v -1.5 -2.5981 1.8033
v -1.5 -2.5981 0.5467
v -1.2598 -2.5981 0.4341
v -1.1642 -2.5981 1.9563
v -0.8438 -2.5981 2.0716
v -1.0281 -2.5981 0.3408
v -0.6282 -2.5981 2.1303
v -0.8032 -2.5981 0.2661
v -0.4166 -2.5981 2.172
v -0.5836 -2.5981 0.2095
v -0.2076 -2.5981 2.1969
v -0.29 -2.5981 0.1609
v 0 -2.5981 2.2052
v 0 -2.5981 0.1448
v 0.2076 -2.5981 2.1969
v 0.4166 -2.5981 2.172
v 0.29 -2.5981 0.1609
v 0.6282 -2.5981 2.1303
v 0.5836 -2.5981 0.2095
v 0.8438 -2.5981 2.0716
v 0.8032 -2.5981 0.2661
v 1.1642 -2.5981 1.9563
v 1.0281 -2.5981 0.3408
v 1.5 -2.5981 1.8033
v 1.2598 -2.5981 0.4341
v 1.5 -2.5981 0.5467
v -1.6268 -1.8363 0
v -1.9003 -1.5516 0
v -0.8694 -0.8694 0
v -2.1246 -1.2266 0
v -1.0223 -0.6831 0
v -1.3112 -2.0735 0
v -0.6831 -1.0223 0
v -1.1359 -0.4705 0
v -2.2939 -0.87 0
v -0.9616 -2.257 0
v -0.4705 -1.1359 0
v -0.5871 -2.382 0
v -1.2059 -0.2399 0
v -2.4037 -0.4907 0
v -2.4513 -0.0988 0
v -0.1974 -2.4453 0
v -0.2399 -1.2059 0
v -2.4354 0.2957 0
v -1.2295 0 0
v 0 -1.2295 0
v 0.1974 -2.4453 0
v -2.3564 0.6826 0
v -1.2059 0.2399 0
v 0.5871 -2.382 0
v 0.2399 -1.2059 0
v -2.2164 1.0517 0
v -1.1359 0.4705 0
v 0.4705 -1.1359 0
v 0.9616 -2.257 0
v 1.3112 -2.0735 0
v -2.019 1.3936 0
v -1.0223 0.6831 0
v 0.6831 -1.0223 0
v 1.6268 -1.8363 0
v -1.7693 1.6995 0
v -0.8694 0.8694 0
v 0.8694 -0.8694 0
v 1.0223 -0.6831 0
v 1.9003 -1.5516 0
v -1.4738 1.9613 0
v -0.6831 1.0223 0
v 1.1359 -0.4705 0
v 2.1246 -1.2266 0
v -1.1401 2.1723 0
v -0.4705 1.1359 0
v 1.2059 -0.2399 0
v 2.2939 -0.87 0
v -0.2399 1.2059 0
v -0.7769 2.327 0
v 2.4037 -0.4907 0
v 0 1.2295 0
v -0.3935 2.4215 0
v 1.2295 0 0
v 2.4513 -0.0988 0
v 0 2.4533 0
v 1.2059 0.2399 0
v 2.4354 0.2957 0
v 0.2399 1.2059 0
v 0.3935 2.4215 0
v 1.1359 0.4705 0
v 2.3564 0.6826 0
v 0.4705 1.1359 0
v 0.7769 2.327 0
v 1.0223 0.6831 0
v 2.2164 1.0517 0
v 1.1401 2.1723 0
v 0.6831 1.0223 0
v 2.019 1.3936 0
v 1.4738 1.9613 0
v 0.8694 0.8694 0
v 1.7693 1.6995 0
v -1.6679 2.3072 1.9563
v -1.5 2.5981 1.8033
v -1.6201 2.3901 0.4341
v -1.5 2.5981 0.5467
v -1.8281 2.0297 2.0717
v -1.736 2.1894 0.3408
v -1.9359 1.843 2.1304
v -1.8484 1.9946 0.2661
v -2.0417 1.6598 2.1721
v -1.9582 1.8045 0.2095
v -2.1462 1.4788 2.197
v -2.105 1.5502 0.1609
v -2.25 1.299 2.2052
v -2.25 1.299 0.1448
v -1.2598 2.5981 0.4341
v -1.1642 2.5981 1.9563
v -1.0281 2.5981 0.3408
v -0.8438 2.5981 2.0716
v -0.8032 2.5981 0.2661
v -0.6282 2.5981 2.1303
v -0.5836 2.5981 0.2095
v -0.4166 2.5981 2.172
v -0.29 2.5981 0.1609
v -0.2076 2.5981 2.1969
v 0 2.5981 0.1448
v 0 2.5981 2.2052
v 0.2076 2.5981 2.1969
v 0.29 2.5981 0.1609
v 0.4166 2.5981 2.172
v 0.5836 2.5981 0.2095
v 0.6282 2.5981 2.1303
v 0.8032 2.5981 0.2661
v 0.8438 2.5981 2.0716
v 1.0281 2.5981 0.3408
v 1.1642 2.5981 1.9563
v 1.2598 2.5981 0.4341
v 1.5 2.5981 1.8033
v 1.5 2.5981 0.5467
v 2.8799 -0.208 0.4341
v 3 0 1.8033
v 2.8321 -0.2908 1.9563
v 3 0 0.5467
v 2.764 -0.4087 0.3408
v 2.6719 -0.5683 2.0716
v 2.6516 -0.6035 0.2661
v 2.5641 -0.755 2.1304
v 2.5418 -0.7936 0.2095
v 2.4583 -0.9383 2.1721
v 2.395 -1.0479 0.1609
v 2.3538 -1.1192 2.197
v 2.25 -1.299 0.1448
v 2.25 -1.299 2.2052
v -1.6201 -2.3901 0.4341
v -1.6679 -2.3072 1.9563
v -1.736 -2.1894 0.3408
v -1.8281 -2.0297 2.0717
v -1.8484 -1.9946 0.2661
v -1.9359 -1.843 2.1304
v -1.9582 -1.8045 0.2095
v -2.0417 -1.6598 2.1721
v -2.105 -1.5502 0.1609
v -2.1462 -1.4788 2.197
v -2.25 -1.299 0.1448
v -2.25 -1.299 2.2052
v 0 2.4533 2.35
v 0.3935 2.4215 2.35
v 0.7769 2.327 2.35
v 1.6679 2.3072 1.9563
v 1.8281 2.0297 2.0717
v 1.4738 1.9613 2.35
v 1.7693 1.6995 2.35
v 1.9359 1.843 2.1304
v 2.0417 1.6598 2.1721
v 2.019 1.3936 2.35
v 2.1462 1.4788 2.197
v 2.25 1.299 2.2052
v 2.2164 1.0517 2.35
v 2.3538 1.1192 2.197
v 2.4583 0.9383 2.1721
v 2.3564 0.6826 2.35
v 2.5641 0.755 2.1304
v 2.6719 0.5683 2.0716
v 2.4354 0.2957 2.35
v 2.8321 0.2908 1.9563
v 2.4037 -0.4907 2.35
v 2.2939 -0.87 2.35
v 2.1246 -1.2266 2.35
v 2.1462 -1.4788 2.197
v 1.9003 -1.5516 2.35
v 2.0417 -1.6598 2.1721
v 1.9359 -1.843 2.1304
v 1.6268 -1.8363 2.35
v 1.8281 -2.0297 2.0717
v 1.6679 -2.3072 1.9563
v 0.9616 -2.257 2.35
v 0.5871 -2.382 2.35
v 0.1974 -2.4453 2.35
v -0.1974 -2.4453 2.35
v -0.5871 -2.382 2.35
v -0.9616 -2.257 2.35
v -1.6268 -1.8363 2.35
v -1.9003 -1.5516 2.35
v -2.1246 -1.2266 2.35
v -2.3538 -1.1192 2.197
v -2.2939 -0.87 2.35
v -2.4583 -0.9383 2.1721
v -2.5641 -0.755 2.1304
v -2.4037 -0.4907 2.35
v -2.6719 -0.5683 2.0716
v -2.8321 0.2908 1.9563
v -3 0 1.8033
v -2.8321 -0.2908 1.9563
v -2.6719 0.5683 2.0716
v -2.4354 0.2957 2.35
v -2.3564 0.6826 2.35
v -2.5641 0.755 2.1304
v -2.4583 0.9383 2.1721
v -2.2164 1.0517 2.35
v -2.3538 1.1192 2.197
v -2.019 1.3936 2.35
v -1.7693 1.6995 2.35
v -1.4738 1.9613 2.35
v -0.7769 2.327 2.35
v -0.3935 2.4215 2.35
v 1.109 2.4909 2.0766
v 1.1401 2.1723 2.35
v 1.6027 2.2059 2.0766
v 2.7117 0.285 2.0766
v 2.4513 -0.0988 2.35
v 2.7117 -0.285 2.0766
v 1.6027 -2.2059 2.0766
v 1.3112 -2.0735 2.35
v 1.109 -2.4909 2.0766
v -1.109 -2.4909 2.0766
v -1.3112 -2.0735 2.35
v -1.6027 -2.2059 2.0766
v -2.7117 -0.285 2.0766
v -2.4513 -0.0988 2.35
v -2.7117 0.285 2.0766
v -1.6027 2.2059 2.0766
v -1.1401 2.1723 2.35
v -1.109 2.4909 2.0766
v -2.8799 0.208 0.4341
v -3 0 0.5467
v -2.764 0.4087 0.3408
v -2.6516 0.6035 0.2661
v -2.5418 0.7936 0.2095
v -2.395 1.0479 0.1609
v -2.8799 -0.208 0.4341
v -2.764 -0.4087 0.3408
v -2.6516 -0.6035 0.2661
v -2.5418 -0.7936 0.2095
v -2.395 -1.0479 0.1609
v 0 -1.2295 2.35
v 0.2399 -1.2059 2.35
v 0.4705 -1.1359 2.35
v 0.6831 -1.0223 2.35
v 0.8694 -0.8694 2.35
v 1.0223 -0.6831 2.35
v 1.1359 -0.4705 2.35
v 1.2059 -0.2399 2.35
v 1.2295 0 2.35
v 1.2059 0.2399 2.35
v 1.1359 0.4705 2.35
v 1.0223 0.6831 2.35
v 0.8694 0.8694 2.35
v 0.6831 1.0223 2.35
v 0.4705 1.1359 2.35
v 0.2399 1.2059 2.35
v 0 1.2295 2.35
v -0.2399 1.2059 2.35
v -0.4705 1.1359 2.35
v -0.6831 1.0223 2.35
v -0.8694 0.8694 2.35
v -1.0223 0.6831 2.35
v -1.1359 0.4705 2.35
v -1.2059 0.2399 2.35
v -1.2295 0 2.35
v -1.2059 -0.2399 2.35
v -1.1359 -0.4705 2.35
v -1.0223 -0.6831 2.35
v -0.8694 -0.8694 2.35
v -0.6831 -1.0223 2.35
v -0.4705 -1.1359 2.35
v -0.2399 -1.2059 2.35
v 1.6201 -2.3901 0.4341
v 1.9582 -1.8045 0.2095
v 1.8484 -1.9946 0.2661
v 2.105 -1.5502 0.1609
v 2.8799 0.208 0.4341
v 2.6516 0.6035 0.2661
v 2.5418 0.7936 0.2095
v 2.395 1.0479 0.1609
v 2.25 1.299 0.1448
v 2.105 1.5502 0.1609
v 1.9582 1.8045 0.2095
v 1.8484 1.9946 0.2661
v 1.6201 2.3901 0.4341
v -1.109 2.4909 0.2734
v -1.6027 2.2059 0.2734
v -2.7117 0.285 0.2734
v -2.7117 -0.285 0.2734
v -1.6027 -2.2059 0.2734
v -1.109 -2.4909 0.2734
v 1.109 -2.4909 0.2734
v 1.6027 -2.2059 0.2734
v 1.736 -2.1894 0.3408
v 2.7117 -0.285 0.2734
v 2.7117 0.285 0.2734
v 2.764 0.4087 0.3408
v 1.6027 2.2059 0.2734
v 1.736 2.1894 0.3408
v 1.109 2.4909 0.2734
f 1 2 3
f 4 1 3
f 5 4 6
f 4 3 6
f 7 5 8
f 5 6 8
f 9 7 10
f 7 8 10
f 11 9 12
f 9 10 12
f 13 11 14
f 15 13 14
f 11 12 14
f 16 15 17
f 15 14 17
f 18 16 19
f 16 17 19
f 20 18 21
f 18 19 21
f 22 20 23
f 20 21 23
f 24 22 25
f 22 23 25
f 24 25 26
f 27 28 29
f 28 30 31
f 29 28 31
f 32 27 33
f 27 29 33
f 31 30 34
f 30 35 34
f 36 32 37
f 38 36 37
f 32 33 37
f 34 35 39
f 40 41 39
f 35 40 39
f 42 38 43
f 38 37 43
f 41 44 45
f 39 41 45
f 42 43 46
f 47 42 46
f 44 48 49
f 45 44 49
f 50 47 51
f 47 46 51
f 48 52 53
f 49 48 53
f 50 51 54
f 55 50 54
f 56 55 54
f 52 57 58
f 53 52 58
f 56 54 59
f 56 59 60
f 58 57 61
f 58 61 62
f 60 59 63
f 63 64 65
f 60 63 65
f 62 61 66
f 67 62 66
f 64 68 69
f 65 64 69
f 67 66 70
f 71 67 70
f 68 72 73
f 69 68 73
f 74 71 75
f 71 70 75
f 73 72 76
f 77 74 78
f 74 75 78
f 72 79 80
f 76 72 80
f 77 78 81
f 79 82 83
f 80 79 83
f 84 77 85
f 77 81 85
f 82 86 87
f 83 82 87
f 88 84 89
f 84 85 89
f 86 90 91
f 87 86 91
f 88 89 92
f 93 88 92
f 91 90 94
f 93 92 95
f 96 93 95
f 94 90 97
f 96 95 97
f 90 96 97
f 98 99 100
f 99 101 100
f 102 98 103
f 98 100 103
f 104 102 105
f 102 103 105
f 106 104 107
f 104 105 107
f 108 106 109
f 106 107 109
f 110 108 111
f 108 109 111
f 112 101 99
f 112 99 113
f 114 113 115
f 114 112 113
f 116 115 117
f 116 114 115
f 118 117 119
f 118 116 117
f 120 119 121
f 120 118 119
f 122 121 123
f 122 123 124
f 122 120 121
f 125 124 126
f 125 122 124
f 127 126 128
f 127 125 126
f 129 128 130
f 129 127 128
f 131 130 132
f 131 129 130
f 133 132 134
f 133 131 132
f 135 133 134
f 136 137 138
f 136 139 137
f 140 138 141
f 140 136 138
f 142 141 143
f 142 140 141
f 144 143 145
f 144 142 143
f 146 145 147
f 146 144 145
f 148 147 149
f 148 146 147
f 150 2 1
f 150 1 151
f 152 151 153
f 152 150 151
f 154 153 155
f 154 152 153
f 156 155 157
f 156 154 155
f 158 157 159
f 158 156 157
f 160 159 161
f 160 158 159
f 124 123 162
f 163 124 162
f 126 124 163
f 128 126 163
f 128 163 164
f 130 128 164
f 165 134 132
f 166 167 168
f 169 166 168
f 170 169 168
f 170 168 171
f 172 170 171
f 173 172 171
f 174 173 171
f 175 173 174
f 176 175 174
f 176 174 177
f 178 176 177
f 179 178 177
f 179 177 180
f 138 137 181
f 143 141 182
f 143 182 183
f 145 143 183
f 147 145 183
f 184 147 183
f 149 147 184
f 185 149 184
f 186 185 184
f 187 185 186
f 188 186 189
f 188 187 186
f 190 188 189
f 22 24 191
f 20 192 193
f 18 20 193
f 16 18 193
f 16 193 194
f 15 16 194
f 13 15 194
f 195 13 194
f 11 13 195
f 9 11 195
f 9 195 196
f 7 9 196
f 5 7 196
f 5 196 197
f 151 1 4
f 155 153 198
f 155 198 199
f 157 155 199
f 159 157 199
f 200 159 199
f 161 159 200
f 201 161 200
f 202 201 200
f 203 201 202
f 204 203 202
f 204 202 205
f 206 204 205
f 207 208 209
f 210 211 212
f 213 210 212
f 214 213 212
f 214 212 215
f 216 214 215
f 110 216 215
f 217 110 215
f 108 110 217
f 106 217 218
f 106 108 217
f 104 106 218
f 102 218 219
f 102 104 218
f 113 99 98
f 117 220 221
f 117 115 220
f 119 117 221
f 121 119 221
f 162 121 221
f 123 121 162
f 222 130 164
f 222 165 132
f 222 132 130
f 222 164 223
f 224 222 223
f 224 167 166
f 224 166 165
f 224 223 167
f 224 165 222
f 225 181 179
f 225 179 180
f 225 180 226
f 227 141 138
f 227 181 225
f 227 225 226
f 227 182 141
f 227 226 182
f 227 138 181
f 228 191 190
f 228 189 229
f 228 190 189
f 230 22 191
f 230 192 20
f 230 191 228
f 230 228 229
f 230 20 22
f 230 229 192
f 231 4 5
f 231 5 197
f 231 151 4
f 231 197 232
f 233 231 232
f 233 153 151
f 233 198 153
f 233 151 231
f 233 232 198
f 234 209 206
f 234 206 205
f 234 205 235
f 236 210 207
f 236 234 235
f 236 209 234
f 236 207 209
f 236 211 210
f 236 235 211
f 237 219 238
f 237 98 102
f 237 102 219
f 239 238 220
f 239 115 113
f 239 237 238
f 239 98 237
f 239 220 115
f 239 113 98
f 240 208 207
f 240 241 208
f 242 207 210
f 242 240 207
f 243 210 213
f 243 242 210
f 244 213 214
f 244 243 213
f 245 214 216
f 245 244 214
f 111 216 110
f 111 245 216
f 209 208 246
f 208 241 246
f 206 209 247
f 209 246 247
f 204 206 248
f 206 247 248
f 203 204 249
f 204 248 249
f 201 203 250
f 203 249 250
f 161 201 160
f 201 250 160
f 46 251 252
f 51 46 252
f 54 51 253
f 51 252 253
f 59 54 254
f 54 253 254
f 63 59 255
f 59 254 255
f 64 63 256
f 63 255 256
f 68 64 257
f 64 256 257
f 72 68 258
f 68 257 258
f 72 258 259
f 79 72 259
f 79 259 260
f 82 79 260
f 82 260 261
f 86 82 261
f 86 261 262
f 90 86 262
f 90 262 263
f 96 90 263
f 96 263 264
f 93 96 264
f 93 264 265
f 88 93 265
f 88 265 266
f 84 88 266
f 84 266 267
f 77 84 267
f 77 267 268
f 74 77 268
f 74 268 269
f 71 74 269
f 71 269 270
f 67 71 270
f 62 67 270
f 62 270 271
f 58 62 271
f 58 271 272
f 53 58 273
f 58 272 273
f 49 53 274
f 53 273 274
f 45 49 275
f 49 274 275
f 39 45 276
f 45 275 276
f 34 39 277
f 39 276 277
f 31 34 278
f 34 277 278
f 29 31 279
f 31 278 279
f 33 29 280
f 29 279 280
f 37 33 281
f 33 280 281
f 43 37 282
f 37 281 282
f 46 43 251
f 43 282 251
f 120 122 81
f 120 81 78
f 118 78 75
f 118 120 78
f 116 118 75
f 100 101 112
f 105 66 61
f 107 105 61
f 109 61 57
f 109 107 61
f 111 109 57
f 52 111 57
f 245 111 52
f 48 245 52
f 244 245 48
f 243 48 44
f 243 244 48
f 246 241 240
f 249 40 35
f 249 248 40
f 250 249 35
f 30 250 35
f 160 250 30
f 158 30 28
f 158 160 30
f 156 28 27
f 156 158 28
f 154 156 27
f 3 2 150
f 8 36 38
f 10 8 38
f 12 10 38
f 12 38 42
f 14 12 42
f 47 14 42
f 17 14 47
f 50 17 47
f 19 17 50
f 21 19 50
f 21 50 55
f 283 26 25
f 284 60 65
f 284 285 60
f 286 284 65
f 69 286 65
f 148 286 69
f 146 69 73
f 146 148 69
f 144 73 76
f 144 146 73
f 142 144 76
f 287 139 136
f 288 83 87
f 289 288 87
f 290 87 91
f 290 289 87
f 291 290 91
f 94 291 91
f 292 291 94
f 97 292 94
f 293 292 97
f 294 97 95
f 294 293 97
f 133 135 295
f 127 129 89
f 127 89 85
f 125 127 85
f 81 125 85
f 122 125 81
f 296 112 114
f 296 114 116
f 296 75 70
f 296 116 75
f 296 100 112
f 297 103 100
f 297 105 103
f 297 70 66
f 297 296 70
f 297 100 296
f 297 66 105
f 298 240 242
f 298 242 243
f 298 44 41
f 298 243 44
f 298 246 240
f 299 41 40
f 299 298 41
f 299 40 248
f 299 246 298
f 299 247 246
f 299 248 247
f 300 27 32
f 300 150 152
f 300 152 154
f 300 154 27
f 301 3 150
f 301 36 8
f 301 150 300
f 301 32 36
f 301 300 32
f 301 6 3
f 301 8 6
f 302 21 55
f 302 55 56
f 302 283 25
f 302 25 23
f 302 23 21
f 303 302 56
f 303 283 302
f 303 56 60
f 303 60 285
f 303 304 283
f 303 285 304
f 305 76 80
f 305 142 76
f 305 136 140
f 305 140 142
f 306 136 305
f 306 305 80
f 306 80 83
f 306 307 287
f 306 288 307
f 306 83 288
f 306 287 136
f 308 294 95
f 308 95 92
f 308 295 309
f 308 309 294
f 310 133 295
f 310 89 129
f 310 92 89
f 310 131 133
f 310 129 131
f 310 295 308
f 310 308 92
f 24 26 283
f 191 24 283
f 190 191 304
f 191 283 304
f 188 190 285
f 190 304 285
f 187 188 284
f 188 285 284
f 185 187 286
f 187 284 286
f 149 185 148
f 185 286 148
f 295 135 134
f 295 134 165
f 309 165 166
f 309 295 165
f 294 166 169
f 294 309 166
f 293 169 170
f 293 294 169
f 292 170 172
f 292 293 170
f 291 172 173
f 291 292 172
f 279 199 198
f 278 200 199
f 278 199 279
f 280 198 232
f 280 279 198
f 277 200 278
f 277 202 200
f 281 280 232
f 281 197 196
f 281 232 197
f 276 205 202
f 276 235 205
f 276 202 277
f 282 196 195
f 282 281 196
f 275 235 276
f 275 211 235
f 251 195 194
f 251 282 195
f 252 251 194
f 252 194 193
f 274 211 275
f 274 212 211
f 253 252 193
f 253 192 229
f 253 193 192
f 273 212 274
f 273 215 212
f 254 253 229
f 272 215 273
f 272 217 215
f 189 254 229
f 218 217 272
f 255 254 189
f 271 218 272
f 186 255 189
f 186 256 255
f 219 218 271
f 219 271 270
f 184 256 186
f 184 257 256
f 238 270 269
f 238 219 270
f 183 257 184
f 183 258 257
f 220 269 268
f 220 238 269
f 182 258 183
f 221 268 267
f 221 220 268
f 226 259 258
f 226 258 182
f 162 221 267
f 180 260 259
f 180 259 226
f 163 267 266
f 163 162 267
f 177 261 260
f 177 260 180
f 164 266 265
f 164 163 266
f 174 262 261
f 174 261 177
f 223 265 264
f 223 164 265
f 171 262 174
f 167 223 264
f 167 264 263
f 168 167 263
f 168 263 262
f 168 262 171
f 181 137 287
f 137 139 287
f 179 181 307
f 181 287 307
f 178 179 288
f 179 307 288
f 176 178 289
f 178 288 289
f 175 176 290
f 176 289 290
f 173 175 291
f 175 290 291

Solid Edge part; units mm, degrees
sketch "Sketch1" plane through (0, 0, 0) normal (0, 0, 1) x (1, 0, 0)
  line L0 (-1.5, -2.5981) -> (0, -2.5981)
  line L1 (1.5, -2.5981) -> (0, -2.5981)
  line L2 (1.5, -2.5981) -> (2.25, -1.299)
  line L3 (3, 0) -> (2.25, -1.299)
  line L4 (3, 0) -> (2.25, 1.299)
  line L5 (1.5, 2.5981) -> (2.25, 1.299)
  line L6 (1.5, 2.5981) -> (0, 2.5981)
  line L7 (-1.5, 2.5981) -> (0, 2.5981)
  line L8 (-1.5, 2.5981) -> (-2.25, 1.299)
  line L9 (-3, 0) -> (-2.25, 1.299)
  line L10 (-3, 0) -> (-2.25, -1.299)
  line L11 (-1.5, -2.5981) -> (-2.25, -1.299)
extrude "Protrusion1" add sketch "Sketch1" along normal blind 2.35
sketch "Sketch2" plane through (0, 0, 0) normal (1, 0, 0) x (0, 1, 0)
  line L0 (2.2294, 2.5739) -> (3.6283, 1.175)
  line L1 (2.2294, -0.2239) -> (3.6283, 1.175)
revolve "RevolvedCutout1" cut sketch "Sketch2" angle 360 about axis through (0, 0, -57) along (0, 0, 1) material side at (0, 2.9642, 1.9098)
hole "Hole_1" at (0, 0, 2.35) direction (0, 0, -1) diameter 2.459 end up to next thread major 3 thread length 2
properties material "Stainless steel"
